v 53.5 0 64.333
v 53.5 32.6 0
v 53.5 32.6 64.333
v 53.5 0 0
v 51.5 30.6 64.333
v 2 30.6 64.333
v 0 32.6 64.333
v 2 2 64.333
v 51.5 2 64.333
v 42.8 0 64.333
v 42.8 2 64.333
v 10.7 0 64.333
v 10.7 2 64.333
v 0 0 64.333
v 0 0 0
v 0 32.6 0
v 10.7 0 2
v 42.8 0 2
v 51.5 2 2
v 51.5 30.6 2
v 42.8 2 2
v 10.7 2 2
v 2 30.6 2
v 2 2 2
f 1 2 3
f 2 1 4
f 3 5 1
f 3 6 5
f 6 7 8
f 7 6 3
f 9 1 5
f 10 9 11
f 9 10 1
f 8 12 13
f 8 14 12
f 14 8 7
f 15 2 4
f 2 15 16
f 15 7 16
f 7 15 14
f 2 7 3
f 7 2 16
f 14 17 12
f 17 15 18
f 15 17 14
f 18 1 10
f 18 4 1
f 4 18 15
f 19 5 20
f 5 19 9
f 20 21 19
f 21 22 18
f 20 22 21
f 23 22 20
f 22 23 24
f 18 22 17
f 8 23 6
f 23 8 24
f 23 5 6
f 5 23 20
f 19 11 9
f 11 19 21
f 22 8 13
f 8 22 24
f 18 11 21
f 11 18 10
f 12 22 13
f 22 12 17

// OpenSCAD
remoteDimensions = [45, 26, 170] * 1.1;
wallThickness = 2;

includeScrewholes = false;
screwholeDiameter = 5;

$fn = 64;

holderDimensions = [remoteDimensions[0] + wallThickness * 2, remoteDimensions[1] + wallThickness * 2, remoteDimensions[2] / 3 + wallThickness];
materialSaverScale = 0.6;


difference()
{
    cube(holderDimensions);

    translate([wallThickness, wallThickness, wallThickness])
        cube(remoteDimensions);

    translate([(holderDimensions[0] - (holderDimensions[0] * materialSaverScale)) / 2, 0, wallThickness])
        cube([holderDimensions[0] * materialSaverScale, wallThickness, holderDimensions[2]]);

    if(includeScrewholes)
        translate([holderDimensions[0] / 2, holderDimensions[1] - wallThickness, holderDimensions[2] / 3 * 2])
            rotate([-90, 0, 0])
                cylinder(d = screwholeDiameter, h = wallThickness);
}
